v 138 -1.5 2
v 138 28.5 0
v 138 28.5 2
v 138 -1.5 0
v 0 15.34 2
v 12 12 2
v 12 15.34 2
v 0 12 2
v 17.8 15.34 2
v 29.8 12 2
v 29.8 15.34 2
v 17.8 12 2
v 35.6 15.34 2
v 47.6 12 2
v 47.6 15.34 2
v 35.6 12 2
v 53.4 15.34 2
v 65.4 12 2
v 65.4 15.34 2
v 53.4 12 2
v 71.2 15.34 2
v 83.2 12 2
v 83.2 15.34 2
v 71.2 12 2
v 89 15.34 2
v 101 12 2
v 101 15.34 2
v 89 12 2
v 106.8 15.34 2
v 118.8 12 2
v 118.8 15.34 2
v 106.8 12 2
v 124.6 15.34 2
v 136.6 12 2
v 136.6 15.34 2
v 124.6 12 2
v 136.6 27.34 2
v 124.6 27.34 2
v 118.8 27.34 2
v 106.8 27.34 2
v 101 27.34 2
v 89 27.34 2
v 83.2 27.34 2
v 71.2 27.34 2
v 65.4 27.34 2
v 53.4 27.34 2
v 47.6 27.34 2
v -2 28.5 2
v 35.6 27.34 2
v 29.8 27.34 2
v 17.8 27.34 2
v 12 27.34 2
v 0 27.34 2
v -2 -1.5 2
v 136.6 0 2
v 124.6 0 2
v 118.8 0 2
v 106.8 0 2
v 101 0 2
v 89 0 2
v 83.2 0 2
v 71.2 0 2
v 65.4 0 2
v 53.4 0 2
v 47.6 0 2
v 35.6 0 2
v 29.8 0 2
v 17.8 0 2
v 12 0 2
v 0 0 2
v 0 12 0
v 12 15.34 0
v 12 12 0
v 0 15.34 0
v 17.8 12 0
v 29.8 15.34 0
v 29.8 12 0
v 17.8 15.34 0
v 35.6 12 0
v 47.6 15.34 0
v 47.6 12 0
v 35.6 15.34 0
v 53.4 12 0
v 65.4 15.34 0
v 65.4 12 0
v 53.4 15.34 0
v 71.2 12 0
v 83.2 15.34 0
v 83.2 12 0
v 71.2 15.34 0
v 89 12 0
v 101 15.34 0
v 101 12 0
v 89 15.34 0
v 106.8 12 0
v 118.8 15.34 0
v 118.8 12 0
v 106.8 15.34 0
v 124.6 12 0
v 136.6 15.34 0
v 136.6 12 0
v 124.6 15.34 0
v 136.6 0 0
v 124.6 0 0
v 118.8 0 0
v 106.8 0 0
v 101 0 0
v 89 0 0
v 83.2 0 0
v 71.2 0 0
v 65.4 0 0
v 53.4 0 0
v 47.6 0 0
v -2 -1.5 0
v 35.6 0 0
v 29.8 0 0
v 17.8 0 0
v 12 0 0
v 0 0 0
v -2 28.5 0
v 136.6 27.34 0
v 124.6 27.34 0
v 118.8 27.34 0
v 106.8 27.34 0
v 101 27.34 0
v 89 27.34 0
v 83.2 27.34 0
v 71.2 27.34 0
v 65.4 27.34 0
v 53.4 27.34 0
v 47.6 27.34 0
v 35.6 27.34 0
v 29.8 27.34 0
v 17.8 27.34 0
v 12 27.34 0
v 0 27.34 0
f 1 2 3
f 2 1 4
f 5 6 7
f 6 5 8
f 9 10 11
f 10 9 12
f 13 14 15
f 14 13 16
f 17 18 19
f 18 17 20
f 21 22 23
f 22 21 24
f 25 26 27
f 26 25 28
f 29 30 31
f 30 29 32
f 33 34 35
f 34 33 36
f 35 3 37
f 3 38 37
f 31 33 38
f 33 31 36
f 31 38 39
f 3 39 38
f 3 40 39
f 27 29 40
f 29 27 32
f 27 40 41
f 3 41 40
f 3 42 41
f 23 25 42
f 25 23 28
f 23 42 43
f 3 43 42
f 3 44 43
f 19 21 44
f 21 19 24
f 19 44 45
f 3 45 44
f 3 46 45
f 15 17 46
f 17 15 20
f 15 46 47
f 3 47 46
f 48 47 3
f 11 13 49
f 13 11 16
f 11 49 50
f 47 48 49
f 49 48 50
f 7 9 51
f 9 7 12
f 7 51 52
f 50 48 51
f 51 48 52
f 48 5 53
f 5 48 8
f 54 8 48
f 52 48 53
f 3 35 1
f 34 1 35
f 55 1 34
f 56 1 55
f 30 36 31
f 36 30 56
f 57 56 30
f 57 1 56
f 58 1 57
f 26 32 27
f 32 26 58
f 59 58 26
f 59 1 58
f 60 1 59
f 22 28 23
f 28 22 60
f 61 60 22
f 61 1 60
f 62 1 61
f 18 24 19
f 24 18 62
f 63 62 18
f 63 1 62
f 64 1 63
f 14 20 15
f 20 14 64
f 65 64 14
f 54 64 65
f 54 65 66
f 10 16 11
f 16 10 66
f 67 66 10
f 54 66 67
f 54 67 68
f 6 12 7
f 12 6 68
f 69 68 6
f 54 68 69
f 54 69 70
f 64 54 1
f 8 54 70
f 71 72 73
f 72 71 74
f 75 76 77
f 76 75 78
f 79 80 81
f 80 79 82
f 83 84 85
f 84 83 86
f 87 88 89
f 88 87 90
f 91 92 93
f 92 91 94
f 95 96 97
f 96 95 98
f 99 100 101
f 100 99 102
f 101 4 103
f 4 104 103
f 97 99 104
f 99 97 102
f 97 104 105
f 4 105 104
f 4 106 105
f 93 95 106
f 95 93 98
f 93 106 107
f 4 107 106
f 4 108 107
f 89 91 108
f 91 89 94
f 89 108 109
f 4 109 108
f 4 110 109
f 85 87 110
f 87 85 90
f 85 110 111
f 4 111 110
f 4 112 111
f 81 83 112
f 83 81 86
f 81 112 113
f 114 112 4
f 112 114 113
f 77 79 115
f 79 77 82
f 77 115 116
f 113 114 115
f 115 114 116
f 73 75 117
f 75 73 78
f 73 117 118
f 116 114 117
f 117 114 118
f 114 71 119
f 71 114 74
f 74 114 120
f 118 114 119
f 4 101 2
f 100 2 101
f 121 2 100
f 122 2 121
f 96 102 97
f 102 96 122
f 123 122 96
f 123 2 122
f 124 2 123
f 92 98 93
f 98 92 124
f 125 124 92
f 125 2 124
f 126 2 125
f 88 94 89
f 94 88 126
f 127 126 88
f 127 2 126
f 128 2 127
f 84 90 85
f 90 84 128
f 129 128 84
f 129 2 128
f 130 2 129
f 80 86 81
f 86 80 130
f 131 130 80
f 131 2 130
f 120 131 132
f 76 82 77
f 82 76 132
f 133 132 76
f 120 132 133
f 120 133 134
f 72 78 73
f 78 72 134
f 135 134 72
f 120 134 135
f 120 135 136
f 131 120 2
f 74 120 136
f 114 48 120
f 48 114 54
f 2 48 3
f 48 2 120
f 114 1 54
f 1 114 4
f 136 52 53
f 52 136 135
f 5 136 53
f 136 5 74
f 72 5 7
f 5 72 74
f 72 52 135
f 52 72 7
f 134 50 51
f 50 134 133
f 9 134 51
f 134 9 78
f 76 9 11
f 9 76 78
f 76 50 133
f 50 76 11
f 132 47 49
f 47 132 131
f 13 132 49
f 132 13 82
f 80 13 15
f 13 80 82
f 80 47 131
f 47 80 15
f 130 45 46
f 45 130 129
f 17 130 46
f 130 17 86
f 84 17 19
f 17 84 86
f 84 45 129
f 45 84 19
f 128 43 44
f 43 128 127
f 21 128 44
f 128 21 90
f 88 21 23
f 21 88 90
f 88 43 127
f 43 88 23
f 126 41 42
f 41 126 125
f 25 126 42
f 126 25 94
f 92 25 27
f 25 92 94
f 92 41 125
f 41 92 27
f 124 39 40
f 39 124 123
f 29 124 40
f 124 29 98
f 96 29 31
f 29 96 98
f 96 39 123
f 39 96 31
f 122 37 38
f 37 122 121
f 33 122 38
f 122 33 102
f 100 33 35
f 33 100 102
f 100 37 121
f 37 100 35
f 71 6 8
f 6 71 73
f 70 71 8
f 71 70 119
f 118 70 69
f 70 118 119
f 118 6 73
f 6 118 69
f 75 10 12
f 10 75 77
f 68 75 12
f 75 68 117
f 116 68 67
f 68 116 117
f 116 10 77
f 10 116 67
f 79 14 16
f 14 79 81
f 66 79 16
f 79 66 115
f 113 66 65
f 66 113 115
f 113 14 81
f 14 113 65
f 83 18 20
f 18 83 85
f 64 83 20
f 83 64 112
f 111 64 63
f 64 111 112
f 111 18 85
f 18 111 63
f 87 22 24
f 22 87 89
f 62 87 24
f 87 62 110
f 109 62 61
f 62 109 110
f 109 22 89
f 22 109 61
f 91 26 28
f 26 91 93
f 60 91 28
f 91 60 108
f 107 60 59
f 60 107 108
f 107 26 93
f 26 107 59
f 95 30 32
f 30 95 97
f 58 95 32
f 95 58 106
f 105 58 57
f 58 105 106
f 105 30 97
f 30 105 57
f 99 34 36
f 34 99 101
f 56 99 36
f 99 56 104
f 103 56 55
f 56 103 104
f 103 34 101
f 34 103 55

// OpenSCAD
module buttonrow() {
    for (i = [0 : 7]) {
        translate([ i*(12.1+5.7), 0, 0 ]) square(12);
    }
}

module buttonshape() {
translate([0,0,0]) buttonrow();
translate([0,12.1+3.24,0]) buttonrow();
}



difference(){translate([-2,-1.5,0])cube([140,30,2]);linear_extrude(2) buttonshape();}
